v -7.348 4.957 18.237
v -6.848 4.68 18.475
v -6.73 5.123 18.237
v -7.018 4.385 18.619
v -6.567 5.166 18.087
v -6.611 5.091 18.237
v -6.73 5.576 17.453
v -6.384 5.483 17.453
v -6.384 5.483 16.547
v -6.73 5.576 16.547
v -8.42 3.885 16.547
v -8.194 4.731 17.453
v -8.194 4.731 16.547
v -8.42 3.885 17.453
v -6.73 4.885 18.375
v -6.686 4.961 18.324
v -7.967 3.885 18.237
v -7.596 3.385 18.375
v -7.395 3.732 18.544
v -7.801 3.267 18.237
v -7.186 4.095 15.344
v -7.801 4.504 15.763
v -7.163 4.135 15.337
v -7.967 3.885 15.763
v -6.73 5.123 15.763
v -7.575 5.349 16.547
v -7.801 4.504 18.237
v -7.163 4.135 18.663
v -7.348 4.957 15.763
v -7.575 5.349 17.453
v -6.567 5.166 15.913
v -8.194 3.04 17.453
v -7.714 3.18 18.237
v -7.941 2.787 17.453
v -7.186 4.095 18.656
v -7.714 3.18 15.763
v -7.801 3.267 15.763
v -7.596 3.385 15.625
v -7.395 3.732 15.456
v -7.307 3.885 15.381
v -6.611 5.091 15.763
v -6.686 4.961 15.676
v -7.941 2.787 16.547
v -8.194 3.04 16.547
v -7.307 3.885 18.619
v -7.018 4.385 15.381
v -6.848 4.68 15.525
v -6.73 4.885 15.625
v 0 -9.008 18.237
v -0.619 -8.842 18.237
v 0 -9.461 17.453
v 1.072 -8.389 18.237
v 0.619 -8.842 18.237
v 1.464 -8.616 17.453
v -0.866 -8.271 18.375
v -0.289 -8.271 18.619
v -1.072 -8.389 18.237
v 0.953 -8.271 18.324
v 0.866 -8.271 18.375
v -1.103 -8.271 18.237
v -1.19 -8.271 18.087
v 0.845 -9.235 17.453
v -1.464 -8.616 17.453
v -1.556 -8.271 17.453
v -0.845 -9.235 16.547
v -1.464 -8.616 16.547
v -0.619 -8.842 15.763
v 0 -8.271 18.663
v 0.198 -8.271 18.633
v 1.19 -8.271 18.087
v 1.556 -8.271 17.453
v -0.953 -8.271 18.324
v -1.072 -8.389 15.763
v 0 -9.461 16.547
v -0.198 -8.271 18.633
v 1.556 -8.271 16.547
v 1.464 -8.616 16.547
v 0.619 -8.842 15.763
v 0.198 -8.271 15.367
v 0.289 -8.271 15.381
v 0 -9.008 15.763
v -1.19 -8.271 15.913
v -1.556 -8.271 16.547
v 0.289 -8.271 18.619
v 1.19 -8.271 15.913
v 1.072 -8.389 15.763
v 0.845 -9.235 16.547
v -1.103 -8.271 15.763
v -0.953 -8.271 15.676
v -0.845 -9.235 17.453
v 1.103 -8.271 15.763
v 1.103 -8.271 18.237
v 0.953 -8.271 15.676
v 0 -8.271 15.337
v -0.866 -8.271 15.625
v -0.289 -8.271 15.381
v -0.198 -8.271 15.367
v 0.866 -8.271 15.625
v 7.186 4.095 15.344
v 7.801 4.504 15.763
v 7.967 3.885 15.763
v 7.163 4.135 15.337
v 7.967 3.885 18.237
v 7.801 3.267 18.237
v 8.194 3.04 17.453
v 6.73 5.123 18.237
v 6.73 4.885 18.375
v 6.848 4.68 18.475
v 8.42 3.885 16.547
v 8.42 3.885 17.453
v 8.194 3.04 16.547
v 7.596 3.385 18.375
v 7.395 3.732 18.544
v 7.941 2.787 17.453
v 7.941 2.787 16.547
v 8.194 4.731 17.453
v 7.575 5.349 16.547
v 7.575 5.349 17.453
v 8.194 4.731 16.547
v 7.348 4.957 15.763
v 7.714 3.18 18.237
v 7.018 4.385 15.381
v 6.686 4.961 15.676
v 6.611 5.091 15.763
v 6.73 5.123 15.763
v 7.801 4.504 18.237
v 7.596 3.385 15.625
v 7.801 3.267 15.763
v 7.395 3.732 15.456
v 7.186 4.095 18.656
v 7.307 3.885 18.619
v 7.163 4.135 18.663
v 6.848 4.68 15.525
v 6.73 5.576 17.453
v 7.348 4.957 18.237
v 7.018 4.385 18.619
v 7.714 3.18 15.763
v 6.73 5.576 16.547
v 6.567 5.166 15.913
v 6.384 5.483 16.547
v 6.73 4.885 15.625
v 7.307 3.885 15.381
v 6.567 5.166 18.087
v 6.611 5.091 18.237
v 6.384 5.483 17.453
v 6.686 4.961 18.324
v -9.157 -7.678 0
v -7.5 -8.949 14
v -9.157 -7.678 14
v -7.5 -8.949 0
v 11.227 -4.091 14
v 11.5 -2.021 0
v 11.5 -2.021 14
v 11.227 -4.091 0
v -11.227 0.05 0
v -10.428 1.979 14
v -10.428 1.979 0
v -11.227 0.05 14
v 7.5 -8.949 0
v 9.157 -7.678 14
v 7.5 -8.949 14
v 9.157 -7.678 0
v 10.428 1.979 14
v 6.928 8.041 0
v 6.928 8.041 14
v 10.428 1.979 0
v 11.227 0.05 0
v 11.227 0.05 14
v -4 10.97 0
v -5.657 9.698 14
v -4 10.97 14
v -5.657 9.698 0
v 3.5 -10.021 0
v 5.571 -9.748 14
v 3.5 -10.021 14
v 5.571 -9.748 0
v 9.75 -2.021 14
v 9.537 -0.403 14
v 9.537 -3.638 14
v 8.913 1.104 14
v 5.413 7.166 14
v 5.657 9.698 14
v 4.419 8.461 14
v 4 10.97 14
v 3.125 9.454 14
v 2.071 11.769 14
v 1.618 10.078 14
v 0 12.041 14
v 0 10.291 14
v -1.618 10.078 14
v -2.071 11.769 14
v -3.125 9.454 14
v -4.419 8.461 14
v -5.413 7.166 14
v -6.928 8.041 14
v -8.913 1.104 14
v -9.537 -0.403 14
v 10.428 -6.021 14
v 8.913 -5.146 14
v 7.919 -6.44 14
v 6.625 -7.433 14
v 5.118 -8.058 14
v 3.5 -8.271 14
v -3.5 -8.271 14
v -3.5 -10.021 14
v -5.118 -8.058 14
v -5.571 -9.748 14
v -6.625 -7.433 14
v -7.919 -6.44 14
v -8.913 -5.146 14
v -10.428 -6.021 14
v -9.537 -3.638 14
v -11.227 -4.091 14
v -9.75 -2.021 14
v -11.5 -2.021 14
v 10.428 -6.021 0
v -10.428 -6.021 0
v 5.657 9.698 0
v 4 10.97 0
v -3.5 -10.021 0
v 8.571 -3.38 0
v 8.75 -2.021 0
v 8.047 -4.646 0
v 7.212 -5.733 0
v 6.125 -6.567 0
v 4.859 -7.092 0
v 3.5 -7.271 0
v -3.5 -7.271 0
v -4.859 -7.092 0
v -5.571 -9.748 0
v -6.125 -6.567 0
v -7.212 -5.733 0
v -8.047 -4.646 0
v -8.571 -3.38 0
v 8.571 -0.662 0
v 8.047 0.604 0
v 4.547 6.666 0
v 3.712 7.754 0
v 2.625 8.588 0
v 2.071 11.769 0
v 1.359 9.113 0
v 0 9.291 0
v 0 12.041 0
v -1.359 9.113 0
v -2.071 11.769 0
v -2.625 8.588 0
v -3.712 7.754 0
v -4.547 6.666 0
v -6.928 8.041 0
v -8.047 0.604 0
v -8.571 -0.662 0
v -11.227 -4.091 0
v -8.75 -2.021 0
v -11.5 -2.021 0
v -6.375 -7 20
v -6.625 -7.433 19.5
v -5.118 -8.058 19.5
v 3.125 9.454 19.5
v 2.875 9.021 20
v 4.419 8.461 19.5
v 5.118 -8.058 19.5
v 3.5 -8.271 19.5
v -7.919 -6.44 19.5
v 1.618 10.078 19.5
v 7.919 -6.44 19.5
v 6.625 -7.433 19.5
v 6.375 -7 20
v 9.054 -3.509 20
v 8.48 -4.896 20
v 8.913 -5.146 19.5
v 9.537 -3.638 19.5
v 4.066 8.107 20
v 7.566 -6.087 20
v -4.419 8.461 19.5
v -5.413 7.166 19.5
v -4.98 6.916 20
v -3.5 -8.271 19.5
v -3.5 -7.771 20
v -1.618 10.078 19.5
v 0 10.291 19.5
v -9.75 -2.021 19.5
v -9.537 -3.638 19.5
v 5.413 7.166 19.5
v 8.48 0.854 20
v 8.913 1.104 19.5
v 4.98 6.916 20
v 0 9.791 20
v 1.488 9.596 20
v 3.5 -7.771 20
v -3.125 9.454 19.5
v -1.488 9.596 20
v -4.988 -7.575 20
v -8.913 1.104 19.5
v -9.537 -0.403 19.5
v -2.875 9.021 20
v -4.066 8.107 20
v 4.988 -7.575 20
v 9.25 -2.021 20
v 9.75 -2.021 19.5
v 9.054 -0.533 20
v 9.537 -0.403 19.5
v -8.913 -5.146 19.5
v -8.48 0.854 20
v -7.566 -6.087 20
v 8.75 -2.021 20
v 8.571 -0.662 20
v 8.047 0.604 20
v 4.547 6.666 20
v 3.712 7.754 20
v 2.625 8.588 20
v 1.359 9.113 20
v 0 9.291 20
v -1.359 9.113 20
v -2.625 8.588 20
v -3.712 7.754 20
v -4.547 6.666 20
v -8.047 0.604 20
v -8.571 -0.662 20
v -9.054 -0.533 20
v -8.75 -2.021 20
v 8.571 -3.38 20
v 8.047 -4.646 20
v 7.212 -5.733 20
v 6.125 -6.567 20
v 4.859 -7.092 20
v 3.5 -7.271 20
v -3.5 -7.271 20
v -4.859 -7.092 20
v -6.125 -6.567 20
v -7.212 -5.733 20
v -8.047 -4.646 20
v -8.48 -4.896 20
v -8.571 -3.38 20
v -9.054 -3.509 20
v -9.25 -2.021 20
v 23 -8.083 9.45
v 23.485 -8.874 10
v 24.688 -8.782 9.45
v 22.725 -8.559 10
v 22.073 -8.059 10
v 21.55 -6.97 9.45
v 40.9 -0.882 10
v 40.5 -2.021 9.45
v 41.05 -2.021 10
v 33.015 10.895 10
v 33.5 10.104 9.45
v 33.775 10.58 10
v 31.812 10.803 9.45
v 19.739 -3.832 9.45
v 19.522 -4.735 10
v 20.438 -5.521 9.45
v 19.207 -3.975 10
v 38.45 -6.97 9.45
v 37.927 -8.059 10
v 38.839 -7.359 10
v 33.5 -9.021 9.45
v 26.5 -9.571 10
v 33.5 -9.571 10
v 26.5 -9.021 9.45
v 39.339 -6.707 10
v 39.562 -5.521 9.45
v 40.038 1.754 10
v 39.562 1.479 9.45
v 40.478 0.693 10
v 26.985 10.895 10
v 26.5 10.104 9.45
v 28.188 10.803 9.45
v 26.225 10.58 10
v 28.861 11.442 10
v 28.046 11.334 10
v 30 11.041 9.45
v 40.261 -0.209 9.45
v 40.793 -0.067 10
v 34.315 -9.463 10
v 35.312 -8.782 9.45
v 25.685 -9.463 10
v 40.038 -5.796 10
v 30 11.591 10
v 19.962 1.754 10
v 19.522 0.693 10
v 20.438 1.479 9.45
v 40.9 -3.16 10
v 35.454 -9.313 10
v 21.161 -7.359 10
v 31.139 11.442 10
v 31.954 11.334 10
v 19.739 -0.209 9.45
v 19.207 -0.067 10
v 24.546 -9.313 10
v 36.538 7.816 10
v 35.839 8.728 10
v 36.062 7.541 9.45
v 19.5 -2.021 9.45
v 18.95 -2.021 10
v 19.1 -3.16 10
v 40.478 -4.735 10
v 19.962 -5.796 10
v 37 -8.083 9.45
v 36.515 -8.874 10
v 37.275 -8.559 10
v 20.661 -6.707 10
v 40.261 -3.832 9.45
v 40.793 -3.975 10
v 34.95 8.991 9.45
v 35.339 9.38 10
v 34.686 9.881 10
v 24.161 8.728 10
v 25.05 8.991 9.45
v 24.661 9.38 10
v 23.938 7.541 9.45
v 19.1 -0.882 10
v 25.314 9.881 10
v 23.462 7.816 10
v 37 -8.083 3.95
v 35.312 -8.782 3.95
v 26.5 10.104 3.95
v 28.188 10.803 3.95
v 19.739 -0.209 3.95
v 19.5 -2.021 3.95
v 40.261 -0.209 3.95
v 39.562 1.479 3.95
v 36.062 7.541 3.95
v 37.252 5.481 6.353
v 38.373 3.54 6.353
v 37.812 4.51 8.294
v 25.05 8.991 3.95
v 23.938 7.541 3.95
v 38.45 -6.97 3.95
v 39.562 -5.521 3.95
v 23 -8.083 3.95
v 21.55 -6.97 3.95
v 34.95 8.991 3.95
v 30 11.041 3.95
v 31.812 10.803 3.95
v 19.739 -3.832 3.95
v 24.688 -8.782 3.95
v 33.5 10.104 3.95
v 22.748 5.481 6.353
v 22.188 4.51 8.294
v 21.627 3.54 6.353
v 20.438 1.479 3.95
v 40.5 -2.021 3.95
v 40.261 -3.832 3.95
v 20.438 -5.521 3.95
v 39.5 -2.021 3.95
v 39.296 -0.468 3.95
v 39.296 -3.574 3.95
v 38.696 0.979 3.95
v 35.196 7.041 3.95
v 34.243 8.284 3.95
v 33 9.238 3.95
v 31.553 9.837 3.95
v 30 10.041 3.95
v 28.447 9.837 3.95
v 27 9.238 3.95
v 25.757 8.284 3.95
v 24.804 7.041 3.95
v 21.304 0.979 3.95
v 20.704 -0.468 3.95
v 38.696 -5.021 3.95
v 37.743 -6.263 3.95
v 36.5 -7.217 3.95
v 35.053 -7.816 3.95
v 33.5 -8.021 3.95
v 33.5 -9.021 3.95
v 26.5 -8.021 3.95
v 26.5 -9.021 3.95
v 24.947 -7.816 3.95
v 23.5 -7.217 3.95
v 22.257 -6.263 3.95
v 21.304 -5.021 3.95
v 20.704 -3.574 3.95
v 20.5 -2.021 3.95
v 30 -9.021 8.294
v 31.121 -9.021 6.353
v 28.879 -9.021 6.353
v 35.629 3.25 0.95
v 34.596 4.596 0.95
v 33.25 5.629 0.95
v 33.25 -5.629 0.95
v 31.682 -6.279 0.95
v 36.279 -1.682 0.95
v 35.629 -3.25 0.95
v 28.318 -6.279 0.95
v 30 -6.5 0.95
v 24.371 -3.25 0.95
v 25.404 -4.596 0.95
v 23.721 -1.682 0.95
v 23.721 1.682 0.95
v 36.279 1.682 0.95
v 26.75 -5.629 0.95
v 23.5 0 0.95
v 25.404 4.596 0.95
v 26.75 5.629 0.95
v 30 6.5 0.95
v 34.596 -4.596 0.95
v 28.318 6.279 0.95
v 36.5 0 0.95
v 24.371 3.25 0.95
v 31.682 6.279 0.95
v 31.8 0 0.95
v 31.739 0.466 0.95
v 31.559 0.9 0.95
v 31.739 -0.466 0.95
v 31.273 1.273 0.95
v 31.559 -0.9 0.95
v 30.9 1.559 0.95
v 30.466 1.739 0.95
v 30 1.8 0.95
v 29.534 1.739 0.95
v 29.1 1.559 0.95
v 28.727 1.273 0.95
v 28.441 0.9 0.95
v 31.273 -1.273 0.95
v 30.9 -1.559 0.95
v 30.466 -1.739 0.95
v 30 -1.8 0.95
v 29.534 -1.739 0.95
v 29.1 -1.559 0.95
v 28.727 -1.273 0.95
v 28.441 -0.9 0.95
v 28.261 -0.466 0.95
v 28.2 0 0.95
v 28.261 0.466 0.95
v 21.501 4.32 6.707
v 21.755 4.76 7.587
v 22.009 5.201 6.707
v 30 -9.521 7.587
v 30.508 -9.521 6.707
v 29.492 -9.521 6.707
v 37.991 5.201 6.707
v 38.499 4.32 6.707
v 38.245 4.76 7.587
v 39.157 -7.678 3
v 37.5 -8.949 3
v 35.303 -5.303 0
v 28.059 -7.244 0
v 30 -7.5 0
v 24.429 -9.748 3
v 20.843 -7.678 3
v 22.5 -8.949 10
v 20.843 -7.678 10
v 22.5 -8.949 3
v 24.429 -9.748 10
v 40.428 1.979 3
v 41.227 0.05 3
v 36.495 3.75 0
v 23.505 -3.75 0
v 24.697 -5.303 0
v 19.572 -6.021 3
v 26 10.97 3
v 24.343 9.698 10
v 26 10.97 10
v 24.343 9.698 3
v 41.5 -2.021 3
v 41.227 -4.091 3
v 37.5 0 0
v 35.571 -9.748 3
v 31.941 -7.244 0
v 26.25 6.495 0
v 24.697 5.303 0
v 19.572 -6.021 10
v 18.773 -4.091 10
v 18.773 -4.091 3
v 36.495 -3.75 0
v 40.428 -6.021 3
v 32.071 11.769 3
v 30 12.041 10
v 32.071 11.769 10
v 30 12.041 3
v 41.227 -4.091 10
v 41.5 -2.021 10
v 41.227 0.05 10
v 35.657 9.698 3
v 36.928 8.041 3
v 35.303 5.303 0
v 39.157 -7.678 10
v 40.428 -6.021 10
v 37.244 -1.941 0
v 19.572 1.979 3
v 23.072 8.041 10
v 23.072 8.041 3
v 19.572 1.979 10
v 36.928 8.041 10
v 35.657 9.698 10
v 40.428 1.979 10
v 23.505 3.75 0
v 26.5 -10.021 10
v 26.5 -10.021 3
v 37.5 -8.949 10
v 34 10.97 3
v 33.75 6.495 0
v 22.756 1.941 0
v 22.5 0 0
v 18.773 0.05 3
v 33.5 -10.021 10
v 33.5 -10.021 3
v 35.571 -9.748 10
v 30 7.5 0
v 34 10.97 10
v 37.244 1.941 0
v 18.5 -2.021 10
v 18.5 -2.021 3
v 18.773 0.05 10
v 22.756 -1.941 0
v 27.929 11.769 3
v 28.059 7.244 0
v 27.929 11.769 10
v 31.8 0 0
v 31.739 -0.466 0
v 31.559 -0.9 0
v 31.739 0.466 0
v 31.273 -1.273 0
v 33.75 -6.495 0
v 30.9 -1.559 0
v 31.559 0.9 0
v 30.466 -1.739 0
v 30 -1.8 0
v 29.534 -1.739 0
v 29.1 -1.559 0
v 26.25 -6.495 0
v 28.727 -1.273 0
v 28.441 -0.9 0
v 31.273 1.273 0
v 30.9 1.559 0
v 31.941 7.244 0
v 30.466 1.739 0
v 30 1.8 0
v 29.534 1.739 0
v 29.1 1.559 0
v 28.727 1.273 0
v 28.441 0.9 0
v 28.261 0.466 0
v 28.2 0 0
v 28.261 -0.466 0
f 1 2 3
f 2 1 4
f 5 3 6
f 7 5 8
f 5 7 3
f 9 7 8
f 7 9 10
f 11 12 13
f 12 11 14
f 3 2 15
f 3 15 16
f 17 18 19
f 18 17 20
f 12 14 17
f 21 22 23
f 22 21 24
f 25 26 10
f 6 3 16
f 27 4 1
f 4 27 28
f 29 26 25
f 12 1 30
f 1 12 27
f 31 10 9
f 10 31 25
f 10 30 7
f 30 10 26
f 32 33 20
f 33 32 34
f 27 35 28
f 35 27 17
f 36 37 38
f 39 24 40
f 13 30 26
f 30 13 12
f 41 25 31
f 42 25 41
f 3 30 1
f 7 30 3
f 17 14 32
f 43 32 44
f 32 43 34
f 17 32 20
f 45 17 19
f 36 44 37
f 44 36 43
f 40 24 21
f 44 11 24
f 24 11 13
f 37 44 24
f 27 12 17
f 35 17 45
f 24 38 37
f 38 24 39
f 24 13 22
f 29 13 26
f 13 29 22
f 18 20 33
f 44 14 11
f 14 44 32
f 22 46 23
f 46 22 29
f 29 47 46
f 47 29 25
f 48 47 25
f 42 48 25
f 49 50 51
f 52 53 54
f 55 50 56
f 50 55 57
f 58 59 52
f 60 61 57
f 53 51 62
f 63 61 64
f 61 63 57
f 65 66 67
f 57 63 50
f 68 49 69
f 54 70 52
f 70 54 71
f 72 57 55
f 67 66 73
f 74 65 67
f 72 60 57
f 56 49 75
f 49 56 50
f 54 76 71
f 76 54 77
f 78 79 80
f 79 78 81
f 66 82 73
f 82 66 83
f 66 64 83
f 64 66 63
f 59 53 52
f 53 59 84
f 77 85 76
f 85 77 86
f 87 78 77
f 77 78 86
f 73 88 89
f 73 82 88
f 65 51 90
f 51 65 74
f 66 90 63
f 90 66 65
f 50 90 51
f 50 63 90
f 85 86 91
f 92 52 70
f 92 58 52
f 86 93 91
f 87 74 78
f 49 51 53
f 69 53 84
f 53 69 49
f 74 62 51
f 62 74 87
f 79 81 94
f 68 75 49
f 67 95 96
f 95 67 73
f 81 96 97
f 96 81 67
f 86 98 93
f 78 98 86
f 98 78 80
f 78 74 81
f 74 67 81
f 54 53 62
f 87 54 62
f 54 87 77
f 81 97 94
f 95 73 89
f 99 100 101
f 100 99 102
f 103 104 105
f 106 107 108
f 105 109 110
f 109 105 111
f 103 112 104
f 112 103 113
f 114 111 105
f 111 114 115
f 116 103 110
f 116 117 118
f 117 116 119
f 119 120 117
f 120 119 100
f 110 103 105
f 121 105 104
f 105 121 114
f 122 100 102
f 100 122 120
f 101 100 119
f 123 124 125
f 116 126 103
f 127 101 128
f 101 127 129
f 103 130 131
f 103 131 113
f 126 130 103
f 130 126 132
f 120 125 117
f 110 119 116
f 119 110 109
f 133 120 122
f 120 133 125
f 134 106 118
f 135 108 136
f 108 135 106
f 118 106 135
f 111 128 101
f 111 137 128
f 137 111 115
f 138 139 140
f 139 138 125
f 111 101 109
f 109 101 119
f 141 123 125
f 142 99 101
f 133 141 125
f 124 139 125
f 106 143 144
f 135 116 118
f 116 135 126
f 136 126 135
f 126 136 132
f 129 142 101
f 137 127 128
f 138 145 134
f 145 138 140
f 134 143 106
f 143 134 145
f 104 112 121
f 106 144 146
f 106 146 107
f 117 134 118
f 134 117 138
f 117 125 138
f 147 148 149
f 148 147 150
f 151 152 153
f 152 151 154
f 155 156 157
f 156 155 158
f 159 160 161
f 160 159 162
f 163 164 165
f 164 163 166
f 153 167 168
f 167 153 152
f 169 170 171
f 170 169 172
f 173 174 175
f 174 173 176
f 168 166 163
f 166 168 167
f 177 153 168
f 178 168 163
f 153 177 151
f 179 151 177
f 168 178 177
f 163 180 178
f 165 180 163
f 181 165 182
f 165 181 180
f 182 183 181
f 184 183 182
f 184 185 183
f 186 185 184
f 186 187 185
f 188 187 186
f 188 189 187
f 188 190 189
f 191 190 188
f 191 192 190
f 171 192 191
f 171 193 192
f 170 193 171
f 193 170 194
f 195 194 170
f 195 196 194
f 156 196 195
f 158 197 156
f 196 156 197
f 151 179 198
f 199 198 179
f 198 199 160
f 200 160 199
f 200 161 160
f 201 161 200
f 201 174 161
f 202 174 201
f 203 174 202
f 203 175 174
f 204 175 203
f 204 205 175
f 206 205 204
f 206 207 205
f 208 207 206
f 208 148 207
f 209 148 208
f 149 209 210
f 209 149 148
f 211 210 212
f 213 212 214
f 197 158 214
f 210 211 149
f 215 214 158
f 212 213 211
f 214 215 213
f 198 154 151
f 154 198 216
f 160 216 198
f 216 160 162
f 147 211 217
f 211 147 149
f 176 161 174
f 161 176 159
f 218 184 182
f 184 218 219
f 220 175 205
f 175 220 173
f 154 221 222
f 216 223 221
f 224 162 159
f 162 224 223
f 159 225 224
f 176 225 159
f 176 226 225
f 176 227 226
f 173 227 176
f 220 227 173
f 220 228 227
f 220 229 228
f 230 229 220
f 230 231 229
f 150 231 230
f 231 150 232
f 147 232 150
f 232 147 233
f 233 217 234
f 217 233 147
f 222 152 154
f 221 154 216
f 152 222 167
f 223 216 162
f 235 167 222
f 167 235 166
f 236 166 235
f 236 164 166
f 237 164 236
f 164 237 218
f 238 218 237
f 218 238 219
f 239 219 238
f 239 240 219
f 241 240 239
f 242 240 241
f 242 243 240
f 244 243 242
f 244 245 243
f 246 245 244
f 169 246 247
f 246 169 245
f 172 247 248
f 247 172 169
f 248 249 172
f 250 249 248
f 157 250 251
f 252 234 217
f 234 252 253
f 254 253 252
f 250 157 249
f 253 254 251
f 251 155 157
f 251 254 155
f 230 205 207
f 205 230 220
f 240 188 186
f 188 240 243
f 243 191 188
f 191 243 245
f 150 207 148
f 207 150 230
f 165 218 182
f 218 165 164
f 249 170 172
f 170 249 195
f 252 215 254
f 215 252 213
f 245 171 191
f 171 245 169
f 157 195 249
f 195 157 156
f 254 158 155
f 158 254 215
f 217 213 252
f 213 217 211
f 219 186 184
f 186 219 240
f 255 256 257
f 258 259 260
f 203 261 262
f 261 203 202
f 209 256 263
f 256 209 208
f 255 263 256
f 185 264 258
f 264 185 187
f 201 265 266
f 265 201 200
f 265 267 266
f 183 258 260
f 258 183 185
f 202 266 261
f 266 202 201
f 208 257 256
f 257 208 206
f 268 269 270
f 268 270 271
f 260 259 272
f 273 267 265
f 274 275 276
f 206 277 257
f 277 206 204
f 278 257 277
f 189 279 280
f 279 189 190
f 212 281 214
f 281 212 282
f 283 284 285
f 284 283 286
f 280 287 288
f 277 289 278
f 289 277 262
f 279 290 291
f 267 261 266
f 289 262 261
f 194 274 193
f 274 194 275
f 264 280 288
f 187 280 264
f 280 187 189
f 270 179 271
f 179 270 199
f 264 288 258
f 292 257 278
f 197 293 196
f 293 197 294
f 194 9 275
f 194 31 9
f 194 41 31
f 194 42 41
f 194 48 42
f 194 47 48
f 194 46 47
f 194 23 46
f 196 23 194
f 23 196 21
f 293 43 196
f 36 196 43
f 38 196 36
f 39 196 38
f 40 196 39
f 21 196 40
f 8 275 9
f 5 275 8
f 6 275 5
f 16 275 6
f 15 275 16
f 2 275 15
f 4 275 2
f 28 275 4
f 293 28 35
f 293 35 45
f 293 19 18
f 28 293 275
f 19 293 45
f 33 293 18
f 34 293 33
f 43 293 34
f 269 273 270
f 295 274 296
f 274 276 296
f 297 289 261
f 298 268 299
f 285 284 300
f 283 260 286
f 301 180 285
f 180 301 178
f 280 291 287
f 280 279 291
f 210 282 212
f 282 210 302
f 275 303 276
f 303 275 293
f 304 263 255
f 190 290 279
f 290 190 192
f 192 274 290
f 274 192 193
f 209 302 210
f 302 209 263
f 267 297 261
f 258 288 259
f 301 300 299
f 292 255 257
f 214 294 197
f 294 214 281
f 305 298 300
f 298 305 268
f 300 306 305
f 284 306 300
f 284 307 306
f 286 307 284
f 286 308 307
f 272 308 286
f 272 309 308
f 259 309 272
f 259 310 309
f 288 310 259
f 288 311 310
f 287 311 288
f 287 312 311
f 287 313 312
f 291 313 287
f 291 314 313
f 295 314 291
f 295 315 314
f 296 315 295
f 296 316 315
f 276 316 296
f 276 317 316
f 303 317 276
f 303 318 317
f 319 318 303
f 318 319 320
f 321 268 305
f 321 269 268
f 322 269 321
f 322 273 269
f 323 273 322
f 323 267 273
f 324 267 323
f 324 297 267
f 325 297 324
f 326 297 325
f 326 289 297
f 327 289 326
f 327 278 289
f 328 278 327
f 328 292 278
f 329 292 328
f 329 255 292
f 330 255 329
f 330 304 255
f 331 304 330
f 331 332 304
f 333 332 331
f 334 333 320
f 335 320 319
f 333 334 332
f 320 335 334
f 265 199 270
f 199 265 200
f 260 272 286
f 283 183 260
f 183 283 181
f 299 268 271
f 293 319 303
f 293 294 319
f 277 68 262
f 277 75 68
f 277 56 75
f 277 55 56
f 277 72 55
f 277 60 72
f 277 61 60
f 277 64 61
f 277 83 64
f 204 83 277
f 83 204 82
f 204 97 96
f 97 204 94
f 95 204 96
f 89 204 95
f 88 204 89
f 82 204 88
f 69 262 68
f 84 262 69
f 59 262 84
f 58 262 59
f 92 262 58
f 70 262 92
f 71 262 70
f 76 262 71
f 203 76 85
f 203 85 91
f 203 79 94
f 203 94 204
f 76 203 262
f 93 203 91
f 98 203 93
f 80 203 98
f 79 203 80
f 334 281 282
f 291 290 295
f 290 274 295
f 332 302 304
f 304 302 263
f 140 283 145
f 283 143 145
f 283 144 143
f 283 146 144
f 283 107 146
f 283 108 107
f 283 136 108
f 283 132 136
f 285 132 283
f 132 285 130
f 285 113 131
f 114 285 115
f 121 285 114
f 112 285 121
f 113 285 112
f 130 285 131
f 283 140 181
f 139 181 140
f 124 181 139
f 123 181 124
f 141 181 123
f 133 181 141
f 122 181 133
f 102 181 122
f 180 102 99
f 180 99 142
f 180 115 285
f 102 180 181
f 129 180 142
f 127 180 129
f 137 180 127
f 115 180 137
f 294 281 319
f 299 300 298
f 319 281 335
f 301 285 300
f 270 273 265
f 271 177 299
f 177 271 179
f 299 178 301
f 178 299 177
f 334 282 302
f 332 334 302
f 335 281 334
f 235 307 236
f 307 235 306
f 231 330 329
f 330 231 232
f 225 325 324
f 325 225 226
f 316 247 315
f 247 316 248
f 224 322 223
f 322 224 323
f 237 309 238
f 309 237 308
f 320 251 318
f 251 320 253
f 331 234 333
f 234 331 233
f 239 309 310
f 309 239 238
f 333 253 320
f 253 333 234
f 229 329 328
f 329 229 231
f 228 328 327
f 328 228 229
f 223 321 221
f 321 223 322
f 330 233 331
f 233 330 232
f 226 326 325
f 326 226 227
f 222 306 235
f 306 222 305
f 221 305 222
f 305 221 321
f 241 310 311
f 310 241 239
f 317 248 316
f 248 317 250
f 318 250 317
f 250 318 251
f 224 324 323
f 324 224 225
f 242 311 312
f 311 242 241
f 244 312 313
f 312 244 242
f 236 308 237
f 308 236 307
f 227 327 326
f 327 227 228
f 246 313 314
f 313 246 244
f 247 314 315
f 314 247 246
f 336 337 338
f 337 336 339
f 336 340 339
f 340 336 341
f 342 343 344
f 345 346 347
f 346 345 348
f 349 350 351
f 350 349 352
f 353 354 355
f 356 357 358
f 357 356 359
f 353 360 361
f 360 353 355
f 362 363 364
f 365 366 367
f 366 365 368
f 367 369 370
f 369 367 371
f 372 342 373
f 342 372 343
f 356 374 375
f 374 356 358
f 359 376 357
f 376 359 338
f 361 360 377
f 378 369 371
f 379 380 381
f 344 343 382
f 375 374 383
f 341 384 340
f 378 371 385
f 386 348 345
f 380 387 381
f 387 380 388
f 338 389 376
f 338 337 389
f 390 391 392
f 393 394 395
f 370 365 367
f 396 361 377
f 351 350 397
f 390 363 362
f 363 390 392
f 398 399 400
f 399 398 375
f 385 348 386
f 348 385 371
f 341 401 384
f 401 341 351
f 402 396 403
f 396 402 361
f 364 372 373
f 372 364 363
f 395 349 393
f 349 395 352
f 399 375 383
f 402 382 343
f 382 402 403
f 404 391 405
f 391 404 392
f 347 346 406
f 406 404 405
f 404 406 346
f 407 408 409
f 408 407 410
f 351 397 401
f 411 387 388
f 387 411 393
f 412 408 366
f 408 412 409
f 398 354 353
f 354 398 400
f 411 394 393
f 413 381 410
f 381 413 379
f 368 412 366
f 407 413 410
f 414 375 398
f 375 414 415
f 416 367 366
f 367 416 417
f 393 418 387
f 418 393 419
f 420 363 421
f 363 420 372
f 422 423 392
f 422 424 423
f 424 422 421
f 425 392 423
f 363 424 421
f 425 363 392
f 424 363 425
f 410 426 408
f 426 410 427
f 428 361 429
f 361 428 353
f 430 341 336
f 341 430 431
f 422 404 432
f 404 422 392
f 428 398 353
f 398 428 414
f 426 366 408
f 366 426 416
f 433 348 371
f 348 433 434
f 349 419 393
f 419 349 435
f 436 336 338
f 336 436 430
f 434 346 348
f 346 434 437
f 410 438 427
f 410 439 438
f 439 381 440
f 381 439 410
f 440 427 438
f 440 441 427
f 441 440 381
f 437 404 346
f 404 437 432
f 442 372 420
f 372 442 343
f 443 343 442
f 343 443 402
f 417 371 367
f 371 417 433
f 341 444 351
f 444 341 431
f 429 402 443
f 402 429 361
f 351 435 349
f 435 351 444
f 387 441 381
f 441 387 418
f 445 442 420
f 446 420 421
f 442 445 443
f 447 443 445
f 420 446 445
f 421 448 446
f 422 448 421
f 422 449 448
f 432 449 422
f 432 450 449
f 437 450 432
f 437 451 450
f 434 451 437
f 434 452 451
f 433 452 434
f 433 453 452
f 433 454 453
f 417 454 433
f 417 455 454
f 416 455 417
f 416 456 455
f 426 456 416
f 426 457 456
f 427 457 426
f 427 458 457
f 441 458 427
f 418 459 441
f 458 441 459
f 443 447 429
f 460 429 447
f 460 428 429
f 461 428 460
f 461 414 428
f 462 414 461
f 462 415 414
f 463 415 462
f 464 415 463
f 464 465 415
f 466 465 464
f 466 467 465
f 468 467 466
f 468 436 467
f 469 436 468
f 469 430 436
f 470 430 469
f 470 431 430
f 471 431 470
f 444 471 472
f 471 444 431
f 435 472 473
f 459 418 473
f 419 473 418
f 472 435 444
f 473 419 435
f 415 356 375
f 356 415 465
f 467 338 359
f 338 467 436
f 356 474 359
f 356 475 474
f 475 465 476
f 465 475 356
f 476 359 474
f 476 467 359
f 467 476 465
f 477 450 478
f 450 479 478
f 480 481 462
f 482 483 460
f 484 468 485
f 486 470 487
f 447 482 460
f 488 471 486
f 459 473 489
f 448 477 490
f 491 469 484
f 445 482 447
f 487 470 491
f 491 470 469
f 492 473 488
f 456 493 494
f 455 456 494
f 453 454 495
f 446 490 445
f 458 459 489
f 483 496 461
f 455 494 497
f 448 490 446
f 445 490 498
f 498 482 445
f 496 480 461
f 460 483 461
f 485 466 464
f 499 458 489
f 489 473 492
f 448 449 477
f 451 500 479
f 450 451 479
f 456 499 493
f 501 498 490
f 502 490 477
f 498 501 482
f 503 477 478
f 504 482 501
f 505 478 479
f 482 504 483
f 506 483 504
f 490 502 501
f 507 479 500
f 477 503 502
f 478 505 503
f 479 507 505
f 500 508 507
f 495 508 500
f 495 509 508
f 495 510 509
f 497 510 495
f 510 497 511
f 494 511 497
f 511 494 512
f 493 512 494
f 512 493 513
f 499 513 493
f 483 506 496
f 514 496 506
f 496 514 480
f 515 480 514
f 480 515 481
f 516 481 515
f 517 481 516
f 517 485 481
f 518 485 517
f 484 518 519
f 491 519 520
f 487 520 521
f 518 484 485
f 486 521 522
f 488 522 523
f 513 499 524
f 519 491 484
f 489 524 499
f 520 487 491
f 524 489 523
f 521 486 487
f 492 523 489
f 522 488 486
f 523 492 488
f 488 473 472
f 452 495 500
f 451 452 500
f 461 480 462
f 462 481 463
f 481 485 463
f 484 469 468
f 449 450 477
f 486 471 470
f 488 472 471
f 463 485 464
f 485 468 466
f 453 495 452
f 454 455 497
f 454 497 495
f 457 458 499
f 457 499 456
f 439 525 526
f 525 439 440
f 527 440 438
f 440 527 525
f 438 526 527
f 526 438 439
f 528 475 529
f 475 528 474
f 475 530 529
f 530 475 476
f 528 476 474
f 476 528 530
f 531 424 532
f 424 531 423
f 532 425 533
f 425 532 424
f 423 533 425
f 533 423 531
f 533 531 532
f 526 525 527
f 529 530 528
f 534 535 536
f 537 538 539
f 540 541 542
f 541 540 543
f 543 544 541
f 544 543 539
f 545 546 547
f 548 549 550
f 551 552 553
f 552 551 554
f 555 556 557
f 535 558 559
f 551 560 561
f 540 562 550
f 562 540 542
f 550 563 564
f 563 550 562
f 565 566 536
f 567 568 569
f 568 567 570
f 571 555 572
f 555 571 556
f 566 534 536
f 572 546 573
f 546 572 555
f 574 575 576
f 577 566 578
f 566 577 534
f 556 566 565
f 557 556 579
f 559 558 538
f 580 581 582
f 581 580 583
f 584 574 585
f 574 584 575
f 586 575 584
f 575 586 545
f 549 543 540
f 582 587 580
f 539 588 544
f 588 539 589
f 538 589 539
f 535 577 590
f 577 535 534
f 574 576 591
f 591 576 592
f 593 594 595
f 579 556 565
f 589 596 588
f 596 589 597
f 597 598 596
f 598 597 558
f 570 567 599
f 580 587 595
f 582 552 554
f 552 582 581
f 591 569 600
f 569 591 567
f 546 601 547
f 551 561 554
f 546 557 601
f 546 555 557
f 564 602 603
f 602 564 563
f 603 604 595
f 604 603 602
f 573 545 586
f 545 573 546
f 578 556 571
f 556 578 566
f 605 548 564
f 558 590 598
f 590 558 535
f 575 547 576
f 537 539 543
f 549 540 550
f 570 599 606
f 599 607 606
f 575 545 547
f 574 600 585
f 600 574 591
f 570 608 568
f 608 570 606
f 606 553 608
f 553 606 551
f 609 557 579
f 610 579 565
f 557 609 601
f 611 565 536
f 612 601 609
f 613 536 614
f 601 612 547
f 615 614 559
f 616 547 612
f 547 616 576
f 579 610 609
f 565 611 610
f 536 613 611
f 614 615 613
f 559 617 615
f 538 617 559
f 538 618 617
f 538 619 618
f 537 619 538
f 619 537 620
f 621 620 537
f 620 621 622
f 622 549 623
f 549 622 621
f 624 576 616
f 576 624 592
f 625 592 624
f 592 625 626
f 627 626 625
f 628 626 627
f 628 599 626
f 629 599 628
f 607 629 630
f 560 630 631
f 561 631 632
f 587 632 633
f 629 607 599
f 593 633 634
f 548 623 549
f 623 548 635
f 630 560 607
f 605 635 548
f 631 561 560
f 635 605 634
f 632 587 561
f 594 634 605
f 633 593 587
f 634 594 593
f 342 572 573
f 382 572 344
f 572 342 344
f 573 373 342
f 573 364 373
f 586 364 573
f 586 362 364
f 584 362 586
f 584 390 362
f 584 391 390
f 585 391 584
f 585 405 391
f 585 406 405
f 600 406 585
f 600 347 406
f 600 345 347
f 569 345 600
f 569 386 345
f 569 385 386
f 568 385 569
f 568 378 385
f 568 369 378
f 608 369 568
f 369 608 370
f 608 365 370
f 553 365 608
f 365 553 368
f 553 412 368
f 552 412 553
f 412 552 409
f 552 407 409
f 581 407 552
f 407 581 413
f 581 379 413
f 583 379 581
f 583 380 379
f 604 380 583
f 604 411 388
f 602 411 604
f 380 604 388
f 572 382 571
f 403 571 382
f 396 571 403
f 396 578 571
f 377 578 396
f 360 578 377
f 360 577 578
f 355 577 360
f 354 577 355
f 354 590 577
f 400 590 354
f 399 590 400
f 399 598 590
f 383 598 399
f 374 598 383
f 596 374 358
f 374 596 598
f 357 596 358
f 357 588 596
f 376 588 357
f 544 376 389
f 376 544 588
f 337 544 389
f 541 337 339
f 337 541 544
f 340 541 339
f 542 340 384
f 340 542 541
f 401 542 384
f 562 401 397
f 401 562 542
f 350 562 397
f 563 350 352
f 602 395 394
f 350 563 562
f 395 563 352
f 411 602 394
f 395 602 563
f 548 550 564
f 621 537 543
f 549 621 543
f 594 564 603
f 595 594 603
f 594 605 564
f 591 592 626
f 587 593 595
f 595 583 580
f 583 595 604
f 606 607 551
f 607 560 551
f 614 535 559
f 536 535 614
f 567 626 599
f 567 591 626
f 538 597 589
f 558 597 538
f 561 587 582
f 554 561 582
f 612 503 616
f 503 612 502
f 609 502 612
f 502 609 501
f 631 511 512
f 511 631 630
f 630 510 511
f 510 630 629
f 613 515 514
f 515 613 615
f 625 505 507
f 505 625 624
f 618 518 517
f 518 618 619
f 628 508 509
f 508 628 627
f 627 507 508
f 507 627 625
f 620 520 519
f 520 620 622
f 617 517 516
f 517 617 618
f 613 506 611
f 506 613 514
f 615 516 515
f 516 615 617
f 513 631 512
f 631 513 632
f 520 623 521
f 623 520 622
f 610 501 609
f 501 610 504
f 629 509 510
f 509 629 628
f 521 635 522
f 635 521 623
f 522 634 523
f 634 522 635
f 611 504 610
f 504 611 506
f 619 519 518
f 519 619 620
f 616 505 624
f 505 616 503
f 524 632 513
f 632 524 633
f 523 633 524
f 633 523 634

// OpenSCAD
/*********************************************************
This design is for a relatively high-force push fit cap
for the actuator columns, with the aim of making springs 
(or elastic bands) easier to fit.
*********************************************************/
use <utilities.scad>;

d=0.05;
outer_r=8;
outer_flat=7;
outer_flat_r=outer_r+outer_flat/sqrt(3)/2; //distance of flats from Z axis
overlap=6;
cap_bottom_t=1;
cap_gap=0.75;

module trylinder(r=1, flat=1, h=d, center=false){
    //A fade between a cylinder and a triangle.
    hull() for(a=[0,120,240]) rotate(a)
        translate([0,flat/sqrt(3),0]) cylinder(r=r, h=h, center=center);
}

module actuator_column_base(h){
    //The bottom half of a push-fit-together "trylindrical" actuator
    //column
    difference(){
        union(){
            trylinder(r=outer_r,flat=outer_flat, h=h);
            hull(){
                r=outer_r-cap_bottom_t-cap_gap;
                trylinder(r=r,flat=outer_flat, h=h+overlap-0.5);
                trylinder(r=r-0.5,flat=outer_flat, h=h+overlap);
            }
            for(a=[0,120,240]) rotate(a+60)
                translate([0,outer_flat_r-cap_bottom_t-cap_gap-0.5,h+overlap/2])
                    sphere(r=cap_gap+1,$fn=12);
        }
        trylinder(r=outer_r-cap_bottom_t*2-cap_gap,flat=outer_flat,h=999,center=true);
    }
}

module actuator_column_cap(h=10){
    //the push-fit cap for an actuator column
    chamfer_angle=30;
    top_r=15/2;
    difference(){
        hull(){
            trylinder(r=outer_r,flat=outer_flat,h=overlap+1);
            cylinder(r=top_r,h=h);
        }
        
        //cut-out the inside
        sequential_hull(){
            translate([0,0,-0.5]) trylinder(r=outer_r-cap_bottom_t+1,flat=outer_flat);
            translate([0,0,0.5]) trylinder(r=outer_r-cap_bottom_t,flat=outer_flat);
            translate([0,0,overlap]) trylinder(r=outer_r-cap_bottom_t,flat=outer_flat);
            translate([0,0,overlap]) trylinder(r=outer_r-2*cap_bottom_t,flat=outer_flat);
            translate([0,0,h-1]) cylinder(r=top_r-1,h=d);
        }
        
        //screw hole
        cylinder(r=3/2*1.2,h=999,center=true);
        
        //indents for locating bumps
        intersection(){
            trylinder(r=outer_r-0.5,flat=outer_flat,h=overlap+1);
            
            for(a=[0,120,240]) rotate(a+60)
                translate([0,outer_flat_r-cap_bottom_t-cap_gap-0.5,overlap/2])
                    rotate([atan(1/sqrt(2)),60,0]) rotate(45) 
                        cube([2,2,2]*(cap_gap+1-0.5),center=true);
        }
    }
}
            
%cylinder(r=14/2,h=50);
actuator_column_base(14, $fn=24);
//translate([0,0,25]) actuator_column_cap(h=10,$fn=24);
translate([30,0,10]) mirror([0,0,1]) actuator_column_cap(h=10,$fn=24); 
